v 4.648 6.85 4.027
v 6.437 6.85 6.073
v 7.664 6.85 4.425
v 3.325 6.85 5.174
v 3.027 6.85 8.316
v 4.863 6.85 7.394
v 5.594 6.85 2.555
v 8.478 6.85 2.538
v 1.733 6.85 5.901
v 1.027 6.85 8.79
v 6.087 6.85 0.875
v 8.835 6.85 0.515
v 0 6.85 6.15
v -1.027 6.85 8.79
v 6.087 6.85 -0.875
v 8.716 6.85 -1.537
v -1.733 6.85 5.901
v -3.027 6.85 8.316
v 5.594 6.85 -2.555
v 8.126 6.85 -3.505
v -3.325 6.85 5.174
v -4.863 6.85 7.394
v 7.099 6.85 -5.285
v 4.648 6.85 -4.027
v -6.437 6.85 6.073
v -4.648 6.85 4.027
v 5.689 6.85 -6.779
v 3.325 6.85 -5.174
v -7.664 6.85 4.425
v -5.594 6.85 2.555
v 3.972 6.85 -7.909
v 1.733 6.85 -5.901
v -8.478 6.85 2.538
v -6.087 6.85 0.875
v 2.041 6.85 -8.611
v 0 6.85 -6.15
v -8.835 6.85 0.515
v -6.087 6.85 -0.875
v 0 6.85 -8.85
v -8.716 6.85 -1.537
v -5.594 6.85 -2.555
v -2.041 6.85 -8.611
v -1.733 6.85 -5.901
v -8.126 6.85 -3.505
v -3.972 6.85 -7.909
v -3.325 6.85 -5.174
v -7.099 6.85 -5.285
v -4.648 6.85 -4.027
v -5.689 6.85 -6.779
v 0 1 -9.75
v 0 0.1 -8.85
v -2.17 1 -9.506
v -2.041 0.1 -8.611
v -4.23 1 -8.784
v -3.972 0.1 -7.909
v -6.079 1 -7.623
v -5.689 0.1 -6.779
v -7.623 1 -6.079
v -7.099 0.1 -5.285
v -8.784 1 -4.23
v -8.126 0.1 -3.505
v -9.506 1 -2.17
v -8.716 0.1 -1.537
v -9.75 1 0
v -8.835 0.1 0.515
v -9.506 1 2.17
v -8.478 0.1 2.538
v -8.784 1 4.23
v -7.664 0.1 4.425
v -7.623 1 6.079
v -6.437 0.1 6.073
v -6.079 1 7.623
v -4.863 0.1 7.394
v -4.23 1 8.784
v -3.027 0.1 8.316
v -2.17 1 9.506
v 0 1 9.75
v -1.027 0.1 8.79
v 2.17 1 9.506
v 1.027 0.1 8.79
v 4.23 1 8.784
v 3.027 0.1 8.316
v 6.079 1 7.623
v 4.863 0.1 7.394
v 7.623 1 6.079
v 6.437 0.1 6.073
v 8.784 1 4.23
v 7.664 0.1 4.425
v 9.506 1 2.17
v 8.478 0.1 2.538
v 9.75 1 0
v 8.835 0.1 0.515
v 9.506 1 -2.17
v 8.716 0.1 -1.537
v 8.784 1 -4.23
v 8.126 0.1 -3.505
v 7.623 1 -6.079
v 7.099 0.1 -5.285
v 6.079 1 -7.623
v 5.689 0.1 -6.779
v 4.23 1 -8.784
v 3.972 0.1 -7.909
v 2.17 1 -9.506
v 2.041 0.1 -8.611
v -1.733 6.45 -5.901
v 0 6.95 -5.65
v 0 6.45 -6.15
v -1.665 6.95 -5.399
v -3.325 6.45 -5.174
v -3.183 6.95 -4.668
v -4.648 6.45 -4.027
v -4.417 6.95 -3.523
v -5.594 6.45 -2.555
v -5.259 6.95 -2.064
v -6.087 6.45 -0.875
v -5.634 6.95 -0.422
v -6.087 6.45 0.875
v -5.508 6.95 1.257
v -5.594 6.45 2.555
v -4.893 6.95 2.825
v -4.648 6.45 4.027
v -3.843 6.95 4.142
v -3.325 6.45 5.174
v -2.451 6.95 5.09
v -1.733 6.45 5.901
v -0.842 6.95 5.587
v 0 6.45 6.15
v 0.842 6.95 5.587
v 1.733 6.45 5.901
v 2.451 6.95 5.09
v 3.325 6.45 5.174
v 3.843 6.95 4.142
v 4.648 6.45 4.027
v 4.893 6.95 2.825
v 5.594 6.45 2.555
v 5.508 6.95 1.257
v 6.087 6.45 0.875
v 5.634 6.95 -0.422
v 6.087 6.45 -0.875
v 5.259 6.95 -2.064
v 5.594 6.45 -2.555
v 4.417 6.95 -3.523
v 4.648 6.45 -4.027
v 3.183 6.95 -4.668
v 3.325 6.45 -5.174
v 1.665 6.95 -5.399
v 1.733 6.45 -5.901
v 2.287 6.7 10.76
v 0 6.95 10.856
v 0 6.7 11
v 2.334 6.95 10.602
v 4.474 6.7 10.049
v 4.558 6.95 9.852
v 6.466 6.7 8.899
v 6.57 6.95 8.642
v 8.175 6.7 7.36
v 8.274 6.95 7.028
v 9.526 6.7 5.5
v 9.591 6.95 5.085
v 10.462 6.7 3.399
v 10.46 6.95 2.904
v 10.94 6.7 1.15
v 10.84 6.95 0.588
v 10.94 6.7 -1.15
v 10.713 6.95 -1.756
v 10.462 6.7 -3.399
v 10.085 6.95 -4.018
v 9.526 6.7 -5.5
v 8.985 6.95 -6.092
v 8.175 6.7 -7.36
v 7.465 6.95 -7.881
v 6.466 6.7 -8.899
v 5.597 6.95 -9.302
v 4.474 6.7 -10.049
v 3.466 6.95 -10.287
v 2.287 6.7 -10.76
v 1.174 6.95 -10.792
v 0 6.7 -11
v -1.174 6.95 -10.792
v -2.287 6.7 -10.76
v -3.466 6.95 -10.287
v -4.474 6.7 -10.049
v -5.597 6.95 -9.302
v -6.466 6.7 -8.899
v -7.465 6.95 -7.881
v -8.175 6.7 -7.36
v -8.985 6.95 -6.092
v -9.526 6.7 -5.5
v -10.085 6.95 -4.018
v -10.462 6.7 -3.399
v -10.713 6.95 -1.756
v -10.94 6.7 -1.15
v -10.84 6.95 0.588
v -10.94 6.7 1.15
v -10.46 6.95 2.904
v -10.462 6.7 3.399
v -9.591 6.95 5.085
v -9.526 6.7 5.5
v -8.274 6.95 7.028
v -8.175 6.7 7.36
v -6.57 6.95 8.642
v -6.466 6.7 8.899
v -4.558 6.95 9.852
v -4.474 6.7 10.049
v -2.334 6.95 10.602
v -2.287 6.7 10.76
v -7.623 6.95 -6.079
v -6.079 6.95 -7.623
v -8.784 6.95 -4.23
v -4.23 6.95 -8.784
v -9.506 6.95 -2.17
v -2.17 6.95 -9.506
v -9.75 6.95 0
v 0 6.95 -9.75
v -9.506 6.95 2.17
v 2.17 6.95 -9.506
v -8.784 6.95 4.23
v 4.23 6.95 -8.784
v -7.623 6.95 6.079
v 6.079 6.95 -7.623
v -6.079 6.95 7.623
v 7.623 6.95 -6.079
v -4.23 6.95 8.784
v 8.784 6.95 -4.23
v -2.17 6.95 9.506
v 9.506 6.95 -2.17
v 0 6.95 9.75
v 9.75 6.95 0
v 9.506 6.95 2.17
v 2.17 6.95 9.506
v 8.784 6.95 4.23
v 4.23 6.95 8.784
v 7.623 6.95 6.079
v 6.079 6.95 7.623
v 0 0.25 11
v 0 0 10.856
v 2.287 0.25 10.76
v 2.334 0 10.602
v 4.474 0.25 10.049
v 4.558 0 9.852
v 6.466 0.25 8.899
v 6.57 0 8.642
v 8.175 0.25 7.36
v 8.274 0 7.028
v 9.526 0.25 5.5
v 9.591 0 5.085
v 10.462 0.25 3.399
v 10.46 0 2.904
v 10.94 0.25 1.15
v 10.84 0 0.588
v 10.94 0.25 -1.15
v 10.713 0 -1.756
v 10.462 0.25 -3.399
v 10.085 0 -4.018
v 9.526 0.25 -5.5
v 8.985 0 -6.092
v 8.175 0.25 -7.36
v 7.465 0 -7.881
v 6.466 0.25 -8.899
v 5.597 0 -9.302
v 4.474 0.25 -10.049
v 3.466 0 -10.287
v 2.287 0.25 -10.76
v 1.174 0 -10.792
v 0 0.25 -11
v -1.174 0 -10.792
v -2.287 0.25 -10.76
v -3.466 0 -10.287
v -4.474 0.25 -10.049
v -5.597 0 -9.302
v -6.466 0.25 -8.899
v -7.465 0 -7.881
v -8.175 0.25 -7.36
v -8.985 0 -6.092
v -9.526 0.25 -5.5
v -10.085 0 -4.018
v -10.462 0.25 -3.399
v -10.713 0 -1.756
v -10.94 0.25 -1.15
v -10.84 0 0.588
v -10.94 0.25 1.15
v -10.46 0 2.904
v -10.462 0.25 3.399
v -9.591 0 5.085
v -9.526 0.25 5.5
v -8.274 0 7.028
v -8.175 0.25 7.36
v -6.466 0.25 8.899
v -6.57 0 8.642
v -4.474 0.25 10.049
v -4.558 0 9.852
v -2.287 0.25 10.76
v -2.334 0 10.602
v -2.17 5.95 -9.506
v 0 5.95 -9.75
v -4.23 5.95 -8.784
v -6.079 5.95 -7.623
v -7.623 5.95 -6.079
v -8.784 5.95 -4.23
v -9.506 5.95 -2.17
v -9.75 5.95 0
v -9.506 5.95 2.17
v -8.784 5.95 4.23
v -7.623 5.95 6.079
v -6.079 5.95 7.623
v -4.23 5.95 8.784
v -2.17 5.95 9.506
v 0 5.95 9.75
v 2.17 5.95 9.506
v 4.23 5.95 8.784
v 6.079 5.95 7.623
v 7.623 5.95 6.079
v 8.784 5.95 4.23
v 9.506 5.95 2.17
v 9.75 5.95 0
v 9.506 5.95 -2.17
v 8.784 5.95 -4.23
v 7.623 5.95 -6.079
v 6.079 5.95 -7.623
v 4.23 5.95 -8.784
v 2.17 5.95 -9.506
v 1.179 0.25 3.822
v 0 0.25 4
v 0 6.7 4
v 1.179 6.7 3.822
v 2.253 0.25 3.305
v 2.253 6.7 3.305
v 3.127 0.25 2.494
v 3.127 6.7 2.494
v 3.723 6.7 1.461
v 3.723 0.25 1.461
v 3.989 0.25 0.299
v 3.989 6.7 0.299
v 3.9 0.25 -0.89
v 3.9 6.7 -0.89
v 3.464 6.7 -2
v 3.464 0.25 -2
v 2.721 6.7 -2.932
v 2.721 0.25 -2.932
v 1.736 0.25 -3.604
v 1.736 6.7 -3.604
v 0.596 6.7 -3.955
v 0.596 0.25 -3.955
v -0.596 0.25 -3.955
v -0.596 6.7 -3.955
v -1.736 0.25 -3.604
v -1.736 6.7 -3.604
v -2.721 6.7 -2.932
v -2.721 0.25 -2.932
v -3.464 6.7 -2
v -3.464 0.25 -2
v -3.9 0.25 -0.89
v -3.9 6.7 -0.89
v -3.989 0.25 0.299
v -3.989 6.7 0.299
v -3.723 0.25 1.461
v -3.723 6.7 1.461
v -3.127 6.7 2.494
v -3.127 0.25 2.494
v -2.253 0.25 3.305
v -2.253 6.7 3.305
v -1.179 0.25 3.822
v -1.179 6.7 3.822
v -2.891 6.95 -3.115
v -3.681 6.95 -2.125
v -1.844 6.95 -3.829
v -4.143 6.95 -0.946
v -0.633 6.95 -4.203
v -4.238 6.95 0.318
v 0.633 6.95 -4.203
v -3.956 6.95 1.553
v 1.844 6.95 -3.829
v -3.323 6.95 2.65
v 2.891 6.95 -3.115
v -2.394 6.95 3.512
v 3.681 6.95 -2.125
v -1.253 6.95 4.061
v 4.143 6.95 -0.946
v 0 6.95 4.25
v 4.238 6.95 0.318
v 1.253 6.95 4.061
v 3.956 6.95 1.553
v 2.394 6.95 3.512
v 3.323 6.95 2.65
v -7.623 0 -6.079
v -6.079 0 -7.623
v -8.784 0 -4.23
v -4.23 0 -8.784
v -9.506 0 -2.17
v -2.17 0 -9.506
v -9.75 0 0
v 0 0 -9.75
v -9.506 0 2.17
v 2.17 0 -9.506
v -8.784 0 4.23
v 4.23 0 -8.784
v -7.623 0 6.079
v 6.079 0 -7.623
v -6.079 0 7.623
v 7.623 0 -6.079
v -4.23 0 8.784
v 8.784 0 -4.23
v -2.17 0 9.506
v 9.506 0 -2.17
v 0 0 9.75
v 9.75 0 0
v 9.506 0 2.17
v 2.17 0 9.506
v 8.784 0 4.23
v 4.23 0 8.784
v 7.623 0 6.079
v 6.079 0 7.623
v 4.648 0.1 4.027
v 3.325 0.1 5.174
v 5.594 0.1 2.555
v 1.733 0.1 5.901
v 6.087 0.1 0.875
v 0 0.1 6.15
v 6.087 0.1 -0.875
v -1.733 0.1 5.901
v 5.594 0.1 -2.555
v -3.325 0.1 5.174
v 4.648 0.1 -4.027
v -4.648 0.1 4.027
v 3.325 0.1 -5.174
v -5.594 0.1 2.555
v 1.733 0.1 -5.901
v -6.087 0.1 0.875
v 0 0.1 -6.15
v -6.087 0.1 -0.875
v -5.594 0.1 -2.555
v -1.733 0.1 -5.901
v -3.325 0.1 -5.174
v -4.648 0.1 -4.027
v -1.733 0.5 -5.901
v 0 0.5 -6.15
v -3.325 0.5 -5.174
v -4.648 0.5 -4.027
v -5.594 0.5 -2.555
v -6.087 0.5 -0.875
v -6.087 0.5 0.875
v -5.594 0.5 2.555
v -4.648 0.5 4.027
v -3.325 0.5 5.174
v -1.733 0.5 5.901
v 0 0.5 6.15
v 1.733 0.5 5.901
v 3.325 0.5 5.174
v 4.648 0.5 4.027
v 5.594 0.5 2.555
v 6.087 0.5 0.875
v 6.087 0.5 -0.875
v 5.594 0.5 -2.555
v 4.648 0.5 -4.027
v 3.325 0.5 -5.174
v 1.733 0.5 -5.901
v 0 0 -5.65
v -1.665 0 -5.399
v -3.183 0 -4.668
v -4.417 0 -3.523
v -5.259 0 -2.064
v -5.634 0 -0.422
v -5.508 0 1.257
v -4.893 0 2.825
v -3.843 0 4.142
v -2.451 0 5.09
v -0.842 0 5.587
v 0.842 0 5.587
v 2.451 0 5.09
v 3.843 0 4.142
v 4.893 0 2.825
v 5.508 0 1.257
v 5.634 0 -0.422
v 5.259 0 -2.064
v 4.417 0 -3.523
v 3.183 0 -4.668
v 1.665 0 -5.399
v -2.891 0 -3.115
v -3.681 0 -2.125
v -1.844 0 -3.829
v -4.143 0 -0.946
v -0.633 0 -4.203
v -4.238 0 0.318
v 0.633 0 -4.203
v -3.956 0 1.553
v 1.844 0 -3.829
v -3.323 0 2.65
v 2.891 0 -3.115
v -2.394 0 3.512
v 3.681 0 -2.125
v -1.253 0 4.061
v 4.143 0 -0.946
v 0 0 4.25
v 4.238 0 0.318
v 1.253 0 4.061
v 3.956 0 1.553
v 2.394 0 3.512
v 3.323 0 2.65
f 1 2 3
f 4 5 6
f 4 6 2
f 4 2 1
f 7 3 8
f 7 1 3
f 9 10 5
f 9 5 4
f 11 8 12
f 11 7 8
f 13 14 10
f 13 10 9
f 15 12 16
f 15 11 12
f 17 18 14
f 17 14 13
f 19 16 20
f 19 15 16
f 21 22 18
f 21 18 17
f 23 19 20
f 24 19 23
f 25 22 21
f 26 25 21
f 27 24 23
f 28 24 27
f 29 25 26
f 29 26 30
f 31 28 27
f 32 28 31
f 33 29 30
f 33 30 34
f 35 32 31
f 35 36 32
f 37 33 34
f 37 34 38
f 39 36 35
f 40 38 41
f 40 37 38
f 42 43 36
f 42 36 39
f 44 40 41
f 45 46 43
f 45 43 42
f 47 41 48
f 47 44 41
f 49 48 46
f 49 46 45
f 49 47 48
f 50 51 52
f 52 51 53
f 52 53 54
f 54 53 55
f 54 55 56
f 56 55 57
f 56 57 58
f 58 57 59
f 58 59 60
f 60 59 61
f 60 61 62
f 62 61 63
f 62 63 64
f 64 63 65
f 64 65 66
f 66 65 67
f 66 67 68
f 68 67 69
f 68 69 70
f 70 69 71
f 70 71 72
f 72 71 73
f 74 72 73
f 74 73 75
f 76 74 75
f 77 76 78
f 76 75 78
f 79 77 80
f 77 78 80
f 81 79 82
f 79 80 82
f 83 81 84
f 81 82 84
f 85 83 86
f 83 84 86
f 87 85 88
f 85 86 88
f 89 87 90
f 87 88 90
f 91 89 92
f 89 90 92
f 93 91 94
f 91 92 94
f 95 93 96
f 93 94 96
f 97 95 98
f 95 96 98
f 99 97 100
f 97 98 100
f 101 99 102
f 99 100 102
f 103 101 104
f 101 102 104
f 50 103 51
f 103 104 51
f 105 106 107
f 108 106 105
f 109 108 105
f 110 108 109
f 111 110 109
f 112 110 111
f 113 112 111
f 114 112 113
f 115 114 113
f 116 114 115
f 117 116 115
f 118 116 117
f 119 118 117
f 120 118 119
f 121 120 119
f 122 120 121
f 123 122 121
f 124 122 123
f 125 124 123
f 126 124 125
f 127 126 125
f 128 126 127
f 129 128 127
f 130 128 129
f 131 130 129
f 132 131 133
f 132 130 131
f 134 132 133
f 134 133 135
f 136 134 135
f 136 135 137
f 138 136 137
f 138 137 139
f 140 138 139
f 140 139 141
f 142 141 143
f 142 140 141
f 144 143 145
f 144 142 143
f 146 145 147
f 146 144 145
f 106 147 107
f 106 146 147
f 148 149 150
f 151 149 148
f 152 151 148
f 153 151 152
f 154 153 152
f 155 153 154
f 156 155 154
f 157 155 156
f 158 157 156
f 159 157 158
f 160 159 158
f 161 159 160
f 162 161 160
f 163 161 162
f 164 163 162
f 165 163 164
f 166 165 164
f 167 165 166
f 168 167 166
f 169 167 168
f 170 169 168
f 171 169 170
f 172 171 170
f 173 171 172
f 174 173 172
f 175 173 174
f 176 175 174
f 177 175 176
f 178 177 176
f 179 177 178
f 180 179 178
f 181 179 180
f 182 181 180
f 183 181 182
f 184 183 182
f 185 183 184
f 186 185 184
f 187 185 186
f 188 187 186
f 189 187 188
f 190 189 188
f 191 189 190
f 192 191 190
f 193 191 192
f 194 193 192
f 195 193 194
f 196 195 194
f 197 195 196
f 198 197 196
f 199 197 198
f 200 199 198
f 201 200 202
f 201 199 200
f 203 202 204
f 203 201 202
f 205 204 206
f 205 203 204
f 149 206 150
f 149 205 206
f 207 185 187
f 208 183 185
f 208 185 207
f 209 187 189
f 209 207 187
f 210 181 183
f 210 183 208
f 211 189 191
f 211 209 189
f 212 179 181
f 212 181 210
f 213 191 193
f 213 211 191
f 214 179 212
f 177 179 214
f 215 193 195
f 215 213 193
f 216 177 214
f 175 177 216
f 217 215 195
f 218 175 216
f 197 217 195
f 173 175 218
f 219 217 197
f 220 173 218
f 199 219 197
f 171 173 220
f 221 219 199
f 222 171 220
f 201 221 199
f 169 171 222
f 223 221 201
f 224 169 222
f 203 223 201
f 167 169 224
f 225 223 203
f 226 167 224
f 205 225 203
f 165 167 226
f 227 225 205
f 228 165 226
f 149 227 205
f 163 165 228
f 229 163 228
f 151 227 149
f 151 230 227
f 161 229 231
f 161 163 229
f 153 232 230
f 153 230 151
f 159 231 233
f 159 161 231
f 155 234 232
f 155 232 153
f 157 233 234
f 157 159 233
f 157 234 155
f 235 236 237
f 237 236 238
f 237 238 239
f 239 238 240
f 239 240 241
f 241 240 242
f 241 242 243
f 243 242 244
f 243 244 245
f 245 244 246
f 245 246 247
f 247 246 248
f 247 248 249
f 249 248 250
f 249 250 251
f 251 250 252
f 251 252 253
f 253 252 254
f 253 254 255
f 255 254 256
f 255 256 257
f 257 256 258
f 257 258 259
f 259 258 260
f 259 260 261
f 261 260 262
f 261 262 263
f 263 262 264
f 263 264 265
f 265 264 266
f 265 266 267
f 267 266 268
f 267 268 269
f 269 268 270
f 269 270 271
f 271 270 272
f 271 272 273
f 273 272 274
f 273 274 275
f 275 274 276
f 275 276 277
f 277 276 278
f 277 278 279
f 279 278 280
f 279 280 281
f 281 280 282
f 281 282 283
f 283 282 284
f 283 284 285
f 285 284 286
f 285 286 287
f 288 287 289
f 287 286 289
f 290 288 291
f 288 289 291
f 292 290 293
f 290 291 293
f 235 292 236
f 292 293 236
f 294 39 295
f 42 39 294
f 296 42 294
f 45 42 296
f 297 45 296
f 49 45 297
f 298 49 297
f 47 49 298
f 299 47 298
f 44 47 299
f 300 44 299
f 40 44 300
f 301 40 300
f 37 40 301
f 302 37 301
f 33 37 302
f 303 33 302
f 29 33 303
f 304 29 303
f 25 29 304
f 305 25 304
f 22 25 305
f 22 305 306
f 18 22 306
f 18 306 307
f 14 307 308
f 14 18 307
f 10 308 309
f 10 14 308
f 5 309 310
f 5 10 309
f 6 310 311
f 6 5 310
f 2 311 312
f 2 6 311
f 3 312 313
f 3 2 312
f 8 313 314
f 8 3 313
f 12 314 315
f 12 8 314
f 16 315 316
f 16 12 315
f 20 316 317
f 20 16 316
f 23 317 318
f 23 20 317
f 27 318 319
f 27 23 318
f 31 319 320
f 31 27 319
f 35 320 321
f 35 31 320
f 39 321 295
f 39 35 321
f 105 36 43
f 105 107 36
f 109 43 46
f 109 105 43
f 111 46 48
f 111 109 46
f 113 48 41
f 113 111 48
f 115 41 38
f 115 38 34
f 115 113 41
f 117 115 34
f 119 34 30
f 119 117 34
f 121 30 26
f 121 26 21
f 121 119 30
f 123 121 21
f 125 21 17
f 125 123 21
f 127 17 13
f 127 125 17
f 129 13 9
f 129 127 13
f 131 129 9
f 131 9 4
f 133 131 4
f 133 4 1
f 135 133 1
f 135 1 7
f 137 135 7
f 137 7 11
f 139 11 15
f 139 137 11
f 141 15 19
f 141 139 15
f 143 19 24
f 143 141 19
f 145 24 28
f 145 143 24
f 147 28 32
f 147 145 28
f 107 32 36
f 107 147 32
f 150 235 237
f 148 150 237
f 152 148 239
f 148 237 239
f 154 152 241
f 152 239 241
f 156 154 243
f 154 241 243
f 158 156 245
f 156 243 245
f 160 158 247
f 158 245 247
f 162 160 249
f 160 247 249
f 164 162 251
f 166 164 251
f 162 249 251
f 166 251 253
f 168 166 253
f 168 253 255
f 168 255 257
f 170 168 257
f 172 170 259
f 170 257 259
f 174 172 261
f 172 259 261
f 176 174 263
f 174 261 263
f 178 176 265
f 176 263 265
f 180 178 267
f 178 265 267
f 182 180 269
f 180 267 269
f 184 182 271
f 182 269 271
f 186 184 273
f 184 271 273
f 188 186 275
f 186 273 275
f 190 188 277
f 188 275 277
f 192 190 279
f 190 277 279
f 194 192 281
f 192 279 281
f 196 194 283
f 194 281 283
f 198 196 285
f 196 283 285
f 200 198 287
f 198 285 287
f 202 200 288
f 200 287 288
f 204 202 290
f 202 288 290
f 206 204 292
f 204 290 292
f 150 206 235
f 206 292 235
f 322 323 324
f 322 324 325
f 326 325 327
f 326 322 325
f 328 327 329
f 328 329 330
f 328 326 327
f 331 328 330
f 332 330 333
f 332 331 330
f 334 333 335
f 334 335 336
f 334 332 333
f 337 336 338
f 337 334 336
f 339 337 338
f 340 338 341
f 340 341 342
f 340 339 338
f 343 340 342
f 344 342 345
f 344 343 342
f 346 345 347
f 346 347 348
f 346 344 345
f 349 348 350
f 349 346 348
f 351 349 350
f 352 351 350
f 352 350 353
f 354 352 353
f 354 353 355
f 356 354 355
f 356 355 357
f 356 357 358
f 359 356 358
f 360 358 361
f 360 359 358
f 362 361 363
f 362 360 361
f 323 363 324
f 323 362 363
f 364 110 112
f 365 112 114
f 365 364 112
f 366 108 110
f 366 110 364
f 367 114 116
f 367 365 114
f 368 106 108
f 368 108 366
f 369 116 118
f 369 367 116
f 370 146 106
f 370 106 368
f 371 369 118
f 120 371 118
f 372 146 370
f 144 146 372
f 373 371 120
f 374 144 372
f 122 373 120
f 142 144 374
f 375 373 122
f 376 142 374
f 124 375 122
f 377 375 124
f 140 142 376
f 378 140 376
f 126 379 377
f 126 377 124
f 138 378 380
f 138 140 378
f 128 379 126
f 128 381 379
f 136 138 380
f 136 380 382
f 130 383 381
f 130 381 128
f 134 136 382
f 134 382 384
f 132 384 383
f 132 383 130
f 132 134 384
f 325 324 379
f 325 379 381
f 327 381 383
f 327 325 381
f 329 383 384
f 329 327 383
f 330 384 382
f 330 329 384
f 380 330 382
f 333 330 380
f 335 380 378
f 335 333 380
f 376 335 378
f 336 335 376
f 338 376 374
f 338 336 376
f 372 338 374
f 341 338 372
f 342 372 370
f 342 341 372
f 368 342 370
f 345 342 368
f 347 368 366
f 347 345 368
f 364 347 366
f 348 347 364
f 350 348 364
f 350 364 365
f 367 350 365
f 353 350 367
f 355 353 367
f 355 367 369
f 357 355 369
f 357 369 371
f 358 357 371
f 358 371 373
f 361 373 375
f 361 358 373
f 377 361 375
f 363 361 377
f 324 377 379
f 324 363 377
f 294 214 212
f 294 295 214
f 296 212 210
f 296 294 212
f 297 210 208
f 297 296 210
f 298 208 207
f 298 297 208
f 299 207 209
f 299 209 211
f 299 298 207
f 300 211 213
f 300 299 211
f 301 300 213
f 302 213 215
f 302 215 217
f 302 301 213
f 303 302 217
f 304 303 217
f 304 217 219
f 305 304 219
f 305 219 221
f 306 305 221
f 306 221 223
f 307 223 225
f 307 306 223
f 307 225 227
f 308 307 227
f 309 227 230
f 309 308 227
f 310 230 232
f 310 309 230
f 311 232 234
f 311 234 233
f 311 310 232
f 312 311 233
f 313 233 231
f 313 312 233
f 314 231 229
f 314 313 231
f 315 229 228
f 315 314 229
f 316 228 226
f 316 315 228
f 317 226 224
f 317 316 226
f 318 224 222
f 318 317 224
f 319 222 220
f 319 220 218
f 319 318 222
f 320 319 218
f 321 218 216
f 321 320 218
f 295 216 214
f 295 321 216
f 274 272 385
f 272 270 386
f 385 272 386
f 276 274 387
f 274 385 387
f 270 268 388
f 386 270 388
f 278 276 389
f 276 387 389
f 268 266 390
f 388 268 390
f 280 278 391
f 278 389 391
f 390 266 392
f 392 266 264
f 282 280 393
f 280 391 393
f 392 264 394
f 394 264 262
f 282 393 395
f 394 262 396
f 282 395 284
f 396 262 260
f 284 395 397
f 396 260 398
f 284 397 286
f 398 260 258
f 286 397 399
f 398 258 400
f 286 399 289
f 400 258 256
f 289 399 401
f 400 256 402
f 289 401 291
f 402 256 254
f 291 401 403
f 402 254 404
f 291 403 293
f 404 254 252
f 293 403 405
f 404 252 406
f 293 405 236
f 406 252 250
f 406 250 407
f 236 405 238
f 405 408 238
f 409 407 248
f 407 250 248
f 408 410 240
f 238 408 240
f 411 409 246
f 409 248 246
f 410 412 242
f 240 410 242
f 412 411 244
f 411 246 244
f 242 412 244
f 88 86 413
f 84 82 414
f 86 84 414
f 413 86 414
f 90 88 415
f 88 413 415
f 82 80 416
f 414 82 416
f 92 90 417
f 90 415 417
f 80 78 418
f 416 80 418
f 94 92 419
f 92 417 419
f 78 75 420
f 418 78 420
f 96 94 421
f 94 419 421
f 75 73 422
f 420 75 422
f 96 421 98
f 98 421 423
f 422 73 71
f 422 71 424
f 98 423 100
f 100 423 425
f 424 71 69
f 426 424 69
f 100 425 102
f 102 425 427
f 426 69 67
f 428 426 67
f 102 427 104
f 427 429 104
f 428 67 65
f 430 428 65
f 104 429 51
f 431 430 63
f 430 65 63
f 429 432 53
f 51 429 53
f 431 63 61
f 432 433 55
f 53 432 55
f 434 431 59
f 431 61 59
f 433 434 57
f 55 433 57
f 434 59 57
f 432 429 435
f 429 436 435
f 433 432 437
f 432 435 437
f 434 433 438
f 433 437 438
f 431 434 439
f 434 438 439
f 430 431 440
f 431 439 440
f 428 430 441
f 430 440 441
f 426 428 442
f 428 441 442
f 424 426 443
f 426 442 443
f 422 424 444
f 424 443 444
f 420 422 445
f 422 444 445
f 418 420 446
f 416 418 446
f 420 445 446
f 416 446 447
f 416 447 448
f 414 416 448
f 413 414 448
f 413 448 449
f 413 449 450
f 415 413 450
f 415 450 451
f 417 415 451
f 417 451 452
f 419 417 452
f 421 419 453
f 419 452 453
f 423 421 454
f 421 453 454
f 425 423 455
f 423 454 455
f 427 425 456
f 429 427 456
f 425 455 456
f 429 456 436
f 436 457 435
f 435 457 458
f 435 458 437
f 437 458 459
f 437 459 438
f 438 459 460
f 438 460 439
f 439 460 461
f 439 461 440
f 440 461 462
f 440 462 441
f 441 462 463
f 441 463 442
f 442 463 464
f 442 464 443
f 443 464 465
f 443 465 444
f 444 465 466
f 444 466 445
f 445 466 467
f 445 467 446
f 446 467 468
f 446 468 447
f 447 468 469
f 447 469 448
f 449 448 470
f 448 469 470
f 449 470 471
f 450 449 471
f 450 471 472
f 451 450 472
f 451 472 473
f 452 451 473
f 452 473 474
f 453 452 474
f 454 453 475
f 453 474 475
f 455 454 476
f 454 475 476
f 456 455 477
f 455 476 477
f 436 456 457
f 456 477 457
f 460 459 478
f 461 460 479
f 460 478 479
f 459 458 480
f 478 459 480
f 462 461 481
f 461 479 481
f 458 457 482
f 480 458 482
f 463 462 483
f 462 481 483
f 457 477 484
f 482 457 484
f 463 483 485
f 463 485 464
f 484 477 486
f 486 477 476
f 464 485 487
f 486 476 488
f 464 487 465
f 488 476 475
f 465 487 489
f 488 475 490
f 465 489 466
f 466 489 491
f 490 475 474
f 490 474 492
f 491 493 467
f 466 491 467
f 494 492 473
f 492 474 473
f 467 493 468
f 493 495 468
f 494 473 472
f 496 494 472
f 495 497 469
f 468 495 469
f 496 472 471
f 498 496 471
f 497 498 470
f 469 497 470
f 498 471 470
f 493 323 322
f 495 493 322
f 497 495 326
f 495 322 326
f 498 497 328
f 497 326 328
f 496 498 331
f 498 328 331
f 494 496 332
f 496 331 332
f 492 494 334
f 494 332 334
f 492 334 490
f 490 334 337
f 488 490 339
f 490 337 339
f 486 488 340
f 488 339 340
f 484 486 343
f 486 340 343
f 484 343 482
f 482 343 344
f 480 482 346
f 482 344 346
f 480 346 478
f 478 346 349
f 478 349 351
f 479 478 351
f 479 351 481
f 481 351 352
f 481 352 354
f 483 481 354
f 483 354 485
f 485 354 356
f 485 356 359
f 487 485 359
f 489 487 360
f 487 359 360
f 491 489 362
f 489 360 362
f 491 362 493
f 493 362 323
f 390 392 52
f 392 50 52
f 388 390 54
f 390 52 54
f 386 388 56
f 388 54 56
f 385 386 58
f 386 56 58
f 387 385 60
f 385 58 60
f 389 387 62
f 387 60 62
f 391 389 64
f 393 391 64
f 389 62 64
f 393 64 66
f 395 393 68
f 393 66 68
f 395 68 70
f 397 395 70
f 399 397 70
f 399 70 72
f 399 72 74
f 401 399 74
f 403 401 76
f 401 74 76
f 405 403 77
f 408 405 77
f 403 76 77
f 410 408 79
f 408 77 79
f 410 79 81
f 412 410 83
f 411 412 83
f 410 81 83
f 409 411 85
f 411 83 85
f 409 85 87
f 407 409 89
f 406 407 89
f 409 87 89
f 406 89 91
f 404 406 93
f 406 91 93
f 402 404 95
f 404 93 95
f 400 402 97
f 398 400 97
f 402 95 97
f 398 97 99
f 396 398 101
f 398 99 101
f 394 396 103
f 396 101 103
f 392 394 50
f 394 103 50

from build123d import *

# Parameters (mm, degrees)
CROQUIS1_R              = 11
CROQUIS1_R_2            = 4
SALIENTE_EXTRUIR1_DEPTH = 6.95
CHAFL_N1_SIZE           = 0.25
CHAFL_N2_SIZE           = 0.25
CHAFL_N2_SIZE2          = 0.144337567


with BuildPart() as part:
    # Croquis1 → Saliente-Extruir1 (new body)
    with BuildSketch(Plane(origin=(0, 0, 0), x_dir=(1, 0, 0), z_dir=(0, 1, 0))):
        with Locations(Location((0, 0, 0), (0, 0, 270))):
            Circle(CROQUIS1_R)
        with Locations(Location((0, 0, 0), (0, 0, 270))):
            Circle(CROQUIS1_R_2, mode=Mode.SUBTRACT)
    extrude(amount=SALIENTE_EXTRUIR1_DEPTH)

    # Croquis2 → Cortar-Revolución1 (revolve, cut)
    with BuildSketch(Plane.XY, mode=Mode.PRIVATE) as cortar_revoluci_n1_sk:
        Polygon((-9.75, 6.95), (-9.75, 5.95), (-8.85, 6.85), (-6.15, 6.85), (-6.15, 6.45), (-5.65, 6.95), align=None)
        Polygon((-8.85, 0.1), (-6.15, 0.1), (-6.15, 0.5), (-5.65, 0), (-9.75, 0), (-9.75, 1), align=None)
    revolve(cortar_revoluci_n1_sk.sketch.rotate(Axis((0, 0, 0), (0, 1, 0)), 270), axis=Axis((0, 0, 0), (0, 1, 0)), mode=Mode.SUBTRACT)

    # Chaflán1
    chafl_n1_edges = [part.edges().sort_by_distance(p)[0] for p in [
        (0, 0, -4),
        (0, 6.95, -4),
    ]]
    chamfer(chafl_n1_edges, length=CHAFL_N1_SIZE)

    # Chaflán2
    chafl_n2_edges = [part.edges().sort_by_distance(p)[0] for p in [
        (0, 0, -11),
        (0, 6.95, -11),
    ]]
    chafl_n2_side = [part.faces().sort_by_distance(p)[0] for p in [
        (0, 3.475, -11),
    ]]
    chamfer(chafl_n2_edges, length=CHAFL_N2_SIZE, length2=CHAFL_N2_SIZE2, reference=chafl_n2_side[0])


solid = part.part
